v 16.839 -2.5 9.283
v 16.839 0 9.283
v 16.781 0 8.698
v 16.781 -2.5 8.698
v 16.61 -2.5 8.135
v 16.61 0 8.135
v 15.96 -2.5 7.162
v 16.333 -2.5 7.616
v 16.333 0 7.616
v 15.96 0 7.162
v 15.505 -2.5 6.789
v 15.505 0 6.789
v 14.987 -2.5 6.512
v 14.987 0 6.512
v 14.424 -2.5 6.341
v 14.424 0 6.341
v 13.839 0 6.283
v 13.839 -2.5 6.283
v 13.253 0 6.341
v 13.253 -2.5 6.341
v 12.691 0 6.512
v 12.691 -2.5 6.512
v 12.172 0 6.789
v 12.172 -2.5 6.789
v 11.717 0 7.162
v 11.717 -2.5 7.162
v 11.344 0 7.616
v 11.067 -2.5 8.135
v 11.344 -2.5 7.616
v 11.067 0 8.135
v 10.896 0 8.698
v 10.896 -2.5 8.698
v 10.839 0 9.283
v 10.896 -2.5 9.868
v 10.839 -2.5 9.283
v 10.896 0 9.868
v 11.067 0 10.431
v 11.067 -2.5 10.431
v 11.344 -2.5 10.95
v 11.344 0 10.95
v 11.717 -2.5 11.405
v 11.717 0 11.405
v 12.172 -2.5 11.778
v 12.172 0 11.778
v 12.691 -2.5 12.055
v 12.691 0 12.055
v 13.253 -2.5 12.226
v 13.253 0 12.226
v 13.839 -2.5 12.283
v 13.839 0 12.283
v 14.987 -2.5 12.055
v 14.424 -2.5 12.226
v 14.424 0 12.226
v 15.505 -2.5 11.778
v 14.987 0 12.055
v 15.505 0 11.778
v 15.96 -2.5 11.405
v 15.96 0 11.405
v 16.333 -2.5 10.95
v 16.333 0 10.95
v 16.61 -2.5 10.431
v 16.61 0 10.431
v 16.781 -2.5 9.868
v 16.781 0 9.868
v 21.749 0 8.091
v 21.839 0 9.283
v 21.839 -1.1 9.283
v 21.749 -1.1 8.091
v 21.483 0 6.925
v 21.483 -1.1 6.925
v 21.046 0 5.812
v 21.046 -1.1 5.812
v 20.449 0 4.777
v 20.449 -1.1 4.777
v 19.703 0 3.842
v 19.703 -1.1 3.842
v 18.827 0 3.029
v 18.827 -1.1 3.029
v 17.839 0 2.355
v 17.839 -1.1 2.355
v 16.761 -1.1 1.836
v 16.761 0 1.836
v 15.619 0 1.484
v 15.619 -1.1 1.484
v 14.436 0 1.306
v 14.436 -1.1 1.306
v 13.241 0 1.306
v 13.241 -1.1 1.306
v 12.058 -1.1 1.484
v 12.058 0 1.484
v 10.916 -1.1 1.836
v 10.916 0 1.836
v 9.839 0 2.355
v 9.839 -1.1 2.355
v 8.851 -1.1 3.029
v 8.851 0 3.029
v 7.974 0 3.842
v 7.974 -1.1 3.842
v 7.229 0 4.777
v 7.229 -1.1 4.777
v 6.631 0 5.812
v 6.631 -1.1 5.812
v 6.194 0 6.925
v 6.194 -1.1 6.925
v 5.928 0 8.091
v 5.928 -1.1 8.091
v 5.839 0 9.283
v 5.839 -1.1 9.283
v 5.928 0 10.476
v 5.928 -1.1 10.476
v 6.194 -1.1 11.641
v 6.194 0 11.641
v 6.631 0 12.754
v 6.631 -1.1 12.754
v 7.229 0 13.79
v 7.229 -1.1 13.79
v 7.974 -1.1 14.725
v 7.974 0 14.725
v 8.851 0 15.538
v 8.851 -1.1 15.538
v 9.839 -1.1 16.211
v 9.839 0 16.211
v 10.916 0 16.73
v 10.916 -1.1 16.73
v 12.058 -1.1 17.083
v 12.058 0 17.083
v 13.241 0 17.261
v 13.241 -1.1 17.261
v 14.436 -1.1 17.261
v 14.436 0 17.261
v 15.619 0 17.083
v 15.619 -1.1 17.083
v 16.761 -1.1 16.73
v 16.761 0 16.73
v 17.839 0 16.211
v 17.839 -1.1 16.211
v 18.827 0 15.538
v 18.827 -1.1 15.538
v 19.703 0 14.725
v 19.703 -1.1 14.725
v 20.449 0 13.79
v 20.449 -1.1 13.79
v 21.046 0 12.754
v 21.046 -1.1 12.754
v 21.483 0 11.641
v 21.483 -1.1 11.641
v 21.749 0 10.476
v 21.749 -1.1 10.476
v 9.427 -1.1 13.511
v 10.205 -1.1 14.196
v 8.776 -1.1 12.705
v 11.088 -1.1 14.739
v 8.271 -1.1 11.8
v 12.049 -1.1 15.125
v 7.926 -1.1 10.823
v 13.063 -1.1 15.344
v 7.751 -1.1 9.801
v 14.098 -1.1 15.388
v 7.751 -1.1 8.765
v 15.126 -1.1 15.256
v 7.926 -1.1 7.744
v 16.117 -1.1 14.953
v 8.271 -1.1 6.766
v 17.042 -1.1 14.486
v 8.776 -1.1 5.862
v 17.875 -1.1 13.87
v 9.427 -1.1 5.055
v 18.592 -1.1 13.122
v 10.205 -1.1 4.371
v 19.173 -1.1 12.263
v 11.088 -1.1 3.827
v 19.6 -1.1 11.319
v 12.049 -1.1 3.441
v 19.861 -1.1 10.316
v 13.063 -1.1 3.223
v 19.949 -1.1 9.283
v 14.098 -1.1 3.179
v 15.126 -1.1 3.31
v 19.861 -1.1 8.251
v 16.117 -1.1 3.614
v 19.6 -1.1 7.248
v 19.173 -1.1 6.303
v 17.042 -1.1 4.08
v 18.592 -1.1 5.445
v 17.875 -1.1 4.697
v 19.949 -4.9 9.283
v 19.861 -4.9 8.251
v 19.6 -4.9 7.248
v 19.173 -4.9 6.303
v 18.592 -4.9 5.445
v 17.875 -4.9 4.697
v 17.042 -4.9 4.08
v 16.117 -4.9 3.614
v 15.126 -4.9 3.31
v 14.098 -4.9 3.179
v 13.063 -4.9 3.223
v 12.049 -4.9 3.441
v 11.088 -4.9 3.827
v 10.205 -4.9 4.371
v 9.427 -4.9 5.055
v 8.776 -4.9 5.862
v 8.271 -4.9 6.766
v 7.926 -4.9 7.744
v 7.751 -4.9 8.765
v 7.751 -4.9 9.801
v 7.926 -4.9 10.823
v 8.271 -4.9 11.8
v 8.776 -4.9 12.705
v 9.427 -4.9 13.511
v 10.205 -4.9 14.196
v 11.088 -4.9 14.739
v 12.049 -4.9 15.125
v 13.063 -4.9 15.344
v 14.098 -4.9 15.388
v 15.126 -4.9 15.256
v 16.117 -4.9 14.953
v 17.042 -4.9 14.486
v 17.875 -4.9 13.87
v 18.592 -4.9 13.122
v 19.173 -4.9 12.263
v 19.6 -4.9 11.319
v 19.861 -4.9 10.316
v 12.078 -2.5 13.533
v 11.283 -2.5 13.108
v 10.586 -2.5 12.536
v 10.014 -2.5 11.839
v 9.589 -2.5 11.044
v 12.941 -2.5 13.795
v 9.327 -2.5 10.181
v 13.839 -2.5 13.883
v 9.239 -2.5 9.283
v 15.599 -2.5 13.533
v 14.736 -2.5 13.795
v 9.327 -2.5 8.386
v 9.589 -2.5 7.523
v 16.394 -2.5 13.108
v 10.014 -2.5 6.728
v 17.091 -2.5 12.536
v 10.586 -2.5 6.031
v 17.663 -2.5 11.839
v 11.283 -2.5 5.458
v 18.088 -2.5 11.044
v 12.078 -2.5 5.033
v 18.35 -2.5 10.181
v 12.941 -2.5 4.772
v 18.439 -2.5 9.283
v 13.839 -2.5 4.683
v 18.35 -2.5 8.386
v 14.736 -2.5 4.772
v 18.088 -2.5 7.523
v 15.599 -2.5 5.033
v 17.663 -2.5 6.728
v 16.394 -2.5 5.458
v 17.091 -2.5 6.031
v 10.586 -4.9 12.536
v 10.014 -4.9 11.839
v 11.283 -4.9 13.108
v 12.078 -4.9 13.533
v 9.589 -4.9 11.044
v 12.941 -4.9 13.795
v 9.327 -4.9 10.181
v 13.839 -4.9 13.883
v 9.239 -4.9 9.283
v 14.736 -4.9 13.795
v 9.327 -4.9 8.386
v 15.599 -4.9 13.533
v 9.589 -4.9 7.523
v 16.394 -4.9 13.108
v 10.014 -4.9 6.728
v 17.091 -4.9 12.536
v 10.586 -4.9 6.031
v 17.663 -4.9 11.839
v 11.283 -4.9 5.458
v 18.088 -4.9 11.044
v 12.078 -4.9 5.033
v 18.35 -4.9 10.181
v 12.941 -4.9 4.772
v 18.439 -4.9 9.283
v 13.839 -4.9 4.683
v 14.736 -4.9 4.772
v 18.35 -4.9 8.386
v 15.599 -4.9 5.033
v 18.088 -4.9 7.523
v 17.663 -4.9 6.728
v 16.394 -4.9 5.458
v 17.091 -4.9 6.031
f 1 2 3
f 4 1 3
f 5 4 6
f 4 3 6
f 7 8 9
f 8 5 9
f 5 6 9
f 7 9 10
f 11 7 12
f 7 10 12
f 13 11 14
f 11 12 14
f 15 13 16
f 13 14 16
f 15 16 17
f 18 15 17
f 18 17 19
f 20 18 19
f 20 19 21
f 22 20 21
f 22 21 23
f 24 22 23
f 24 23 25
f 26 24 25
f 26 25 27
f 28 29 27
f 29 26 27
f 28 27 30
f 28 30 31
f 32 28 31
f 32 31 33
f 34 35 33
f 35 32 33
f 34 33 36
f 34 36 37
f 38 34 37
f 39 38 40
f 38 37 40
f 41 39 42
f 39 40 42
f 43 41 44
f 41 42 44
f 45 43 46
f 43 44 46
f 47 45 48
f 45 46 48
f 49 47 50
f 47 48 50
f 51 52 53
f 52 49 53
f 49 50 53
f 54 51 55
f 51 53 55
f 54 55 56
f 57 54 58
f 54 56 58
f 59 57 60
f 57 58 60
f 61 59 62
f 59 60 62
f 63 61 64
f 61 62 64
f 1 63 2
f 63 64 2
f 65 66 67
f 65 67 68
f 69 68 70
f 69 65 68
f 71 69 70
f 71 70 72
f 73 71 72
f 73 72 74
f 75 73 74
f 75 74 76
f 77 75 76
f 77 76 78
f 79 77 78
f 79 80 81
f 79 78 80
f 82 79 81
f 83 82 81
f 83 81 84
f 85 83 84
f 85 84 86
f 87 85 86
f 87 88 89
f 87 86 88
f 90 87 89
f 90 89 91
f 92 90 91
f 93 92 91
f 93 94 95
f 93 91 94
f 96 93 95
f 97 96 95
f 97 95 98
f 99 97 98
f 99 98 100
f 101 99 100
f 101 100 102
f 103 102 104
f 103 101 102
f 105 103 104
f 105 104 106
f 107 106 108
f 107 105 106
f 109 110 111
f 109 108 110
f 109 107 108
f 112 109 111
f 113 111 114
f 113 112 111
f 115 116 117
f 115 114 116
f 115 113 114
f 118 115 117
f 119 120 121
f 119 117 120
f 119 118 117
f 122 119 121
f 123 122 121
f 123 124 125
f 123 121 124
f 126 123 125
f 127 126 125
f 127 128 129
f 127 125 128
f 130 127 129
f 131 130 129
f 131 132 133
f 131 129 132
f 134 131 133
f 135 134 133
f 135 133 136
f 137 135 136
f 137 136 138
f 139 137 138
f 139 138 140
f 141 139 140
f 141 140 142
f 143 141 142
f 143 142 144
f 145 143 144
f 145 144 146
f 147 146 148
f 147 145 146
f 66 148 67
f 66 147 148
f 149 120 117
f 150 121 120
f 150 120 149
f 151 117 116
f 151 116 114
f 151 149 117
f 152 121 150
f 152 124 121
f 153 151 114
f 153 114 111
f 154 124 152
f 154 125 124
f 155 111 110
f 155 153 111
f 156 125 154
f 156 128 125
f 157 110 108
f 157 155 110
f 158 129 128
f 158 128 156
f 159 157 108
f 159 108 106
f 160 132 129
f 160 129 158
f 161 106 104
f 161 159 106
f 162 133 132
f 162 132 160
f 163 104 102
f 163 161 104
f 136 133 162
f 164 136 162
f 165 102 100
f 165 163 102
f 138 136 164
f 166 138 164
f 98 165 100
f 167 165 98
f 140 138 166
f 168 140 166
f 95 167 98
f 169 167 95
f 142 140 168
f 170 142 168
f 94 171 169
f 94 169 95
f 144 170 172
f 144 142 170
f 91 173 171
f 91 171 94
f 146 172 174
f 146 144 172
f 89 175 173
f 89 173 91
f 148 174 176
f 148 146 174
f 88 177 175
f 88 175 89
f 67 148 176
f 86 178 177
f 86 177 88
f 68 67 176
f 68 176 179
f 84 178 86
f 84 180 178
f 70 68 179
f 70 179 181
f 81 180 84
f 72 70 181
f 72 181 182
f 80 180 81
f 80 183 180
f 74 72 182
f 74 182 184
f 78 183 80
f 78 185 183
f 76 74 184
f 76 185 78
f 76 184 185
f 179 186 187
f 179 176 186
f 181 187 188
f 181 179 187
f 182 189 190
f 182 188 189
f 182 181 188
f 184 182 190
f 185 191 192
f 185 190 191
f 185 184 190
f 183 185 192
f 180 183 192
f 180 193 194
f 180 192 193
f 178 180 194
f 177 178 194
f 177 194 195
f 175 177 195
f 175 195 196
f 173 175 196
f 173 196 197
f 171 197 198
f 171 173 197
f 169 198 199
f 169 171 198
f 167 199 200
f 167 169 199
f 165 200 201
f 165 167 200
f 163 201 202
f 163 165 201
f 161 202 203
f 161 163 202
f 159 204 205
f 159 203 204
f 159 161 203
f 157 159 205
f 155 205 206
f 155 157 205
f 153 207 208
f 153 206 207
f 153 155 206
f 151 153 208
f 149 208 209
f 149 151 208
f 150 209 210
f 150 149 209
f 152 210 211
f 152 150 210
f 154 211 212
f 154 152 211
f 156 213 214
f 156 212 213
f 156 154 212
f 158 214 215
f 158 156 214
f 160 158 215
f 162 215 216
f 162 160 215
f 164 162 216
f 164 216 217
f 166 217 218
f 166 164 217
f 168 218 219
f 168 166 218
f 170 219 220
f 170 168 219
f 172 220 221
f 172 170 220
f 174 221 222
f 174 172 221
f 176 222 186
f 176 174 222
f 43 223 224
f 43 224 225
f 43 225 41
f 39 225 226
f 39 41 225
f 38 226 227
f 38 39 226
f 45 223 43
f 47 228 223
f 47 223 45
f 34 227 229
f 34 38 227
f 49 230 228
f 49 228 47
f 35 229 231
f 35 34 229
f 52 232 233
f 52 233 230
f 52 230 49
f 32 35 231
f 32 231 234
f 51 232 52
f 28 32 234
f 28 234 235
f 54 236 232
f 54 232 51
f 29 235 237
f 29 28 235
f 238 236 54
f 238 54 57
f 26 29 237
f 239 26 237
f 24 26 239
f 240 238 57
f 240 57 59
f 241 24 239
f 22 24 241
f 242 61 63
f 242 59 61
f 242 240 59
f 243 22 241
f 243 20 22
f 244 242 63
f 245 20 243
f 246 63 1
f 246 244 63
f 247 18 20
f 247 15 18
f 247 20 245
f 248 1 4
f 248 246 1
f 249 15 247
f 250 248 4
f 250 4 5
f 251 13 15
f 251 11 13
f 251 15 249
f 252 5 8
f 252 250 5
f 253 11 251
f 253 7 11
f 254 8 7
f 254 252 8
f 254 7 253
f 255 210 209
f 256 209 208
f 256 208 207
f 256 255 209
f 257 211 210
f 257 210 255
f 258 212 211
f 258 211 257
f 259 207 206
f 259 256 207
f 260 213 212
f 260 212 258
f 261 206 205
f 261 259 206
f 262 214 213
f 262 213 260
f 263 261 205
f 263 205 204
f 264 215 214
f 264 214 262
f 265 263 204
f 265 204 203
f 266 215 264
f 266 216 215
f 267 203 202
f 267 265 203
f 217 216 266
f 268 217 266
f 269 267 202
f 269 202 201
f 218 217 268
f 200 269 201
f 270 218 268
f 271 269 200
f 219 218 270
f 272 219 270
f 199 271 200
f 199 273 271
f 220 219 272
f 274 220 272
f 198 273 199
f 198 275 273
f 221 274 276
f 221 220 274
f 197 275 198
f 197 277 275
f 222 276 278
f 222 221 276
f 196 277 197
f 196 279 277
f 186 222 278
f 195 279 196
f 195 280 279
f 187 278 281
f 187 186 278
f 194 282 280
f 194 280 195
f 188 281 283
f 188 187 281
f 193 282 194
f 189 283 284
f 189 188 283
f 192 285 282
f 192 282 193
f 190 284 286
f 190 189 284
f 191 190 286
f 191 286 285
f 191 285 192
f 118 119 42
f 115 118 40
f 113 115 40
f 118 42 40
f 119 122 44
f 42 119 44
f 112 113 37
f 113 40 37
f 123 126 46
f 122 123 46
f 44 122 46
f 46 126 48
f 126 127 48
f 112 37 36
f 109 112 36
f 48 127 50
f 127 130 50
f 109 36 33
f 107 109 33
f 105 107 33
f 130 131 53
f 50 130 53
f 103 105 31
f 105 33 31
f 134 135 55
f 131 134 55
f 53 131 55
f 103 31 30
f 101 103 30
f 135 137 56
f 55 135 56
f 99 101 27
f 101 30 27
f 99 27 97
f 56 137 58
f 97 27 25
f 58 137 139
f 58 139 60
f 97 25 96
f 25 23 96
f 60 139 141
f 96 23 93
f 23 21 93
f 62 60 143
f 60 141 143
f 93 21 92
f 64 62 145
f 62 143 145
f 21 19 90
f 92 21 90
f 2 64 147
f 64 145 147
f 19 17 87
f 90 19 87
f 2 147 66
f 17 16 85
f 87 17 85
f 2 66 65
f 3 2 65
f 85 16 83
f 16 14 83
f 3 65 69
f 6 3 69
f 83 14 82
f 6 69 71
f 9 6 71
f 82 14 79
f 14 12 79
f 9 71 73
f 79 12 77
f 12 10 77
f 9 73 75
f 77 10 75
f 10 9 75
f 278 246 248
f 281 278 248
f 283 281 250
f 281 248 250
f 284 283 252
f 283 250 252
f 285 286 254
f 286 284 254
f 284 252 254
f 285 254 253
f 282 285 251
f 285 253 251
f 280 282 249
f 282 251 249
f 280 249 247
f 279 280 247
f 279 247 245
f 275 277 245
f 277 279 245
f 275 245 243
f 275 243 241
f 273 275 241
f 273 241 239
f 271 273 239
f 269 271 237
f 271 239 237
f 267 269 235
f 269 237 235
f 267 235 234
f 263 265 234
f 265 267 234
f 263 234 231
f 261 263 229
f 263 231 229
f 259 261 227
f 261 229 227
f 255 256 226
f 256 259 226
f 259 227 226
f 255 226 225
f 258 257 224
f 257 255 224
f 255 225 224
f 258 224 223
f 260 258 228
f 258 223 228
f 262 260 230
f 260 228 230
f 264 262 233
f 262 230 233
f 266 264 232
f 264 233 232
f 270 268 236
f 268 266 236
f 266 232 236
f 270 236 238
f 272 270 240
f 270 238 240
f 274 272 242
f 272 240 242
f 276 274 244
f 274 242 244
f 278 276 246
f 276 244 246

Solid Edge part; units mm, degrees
sketch "Sketch1" plane through (0, 0, 0) normal (0, -1, 0) x (1, 0, 0)
  circle A0 centre (13.8386, 9.2832) radius 8
  circle A1 centre (13.8386, 9.2832) radius 3
extrude "Protrusion1" add sketch "Sketch1" along normal blind 1.1
sketch "Sketch2" plane through (13.8386, -1.1, 9.2832) normal (0, -1, 0) x (1, 0, 0)
  circle A0 centre (0, 0) radius 4.6
  circle A1 centre (0, 0) radius 6.11
extrude "ExtrudedProtrusion_2" add sketch "Sketch2" along normal blind 3.8
sketch "Sketch3" plane through (13.8386, -1.1, 9.2832) normal (0, -1, 0) x (1, 0, 0)
  circle A0 centre (0, 0) radius 3
  circle A1 centre (0, 0) radius 4.6
extrude "ExtrudedProtrusion_3" add sketch "Sketch3" along normal blind 1.4
